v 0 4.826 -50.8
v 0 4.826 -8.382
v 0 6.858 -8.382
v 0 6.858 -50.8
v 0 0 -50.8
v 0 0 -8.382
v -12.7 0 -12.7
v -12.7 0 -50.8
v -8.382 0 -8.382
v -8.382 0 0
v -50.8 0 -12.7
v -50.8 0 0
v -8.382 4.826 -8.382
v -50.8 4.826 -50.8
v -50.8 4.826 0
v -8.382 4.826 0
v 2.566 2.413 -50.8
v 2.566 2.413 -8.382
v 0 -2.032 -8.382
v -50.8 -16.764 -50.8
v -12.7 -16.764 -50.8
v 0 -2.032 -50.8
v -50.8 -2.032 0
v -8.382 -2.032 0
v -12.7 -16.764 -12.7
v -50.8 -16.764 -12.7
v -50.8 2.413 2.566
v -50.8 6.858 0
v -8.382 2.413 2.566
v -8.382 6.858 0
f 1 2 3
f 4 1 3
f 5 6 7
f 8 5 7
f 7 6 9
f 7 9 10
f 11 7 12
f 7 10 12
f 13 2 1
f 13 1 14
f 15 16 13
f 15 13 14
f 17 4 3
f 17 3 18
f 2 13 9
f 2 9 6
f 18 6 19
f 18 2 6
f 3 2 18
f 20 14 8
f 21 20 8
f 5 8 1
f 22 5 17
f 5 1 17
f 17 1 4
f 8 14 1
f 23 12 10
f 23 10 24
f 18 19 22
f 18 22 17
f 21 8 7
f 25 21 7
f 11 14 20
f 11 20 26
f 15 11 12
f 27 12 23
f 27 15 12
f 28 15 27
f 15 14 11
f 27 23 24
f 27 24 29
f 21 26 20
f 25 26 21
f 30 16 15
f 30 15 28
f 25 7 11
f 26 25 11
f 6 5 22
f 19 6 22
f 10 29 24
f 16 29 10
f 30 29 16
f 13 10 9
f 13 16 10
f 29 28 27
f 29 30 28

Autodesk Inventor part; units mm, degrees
ref_plane "YZ Plane" through (0, 0, 0) normal (1, 0, 0) x (0, 1, 0)
ref_plane "XZ Plane" through (0, 0, 0) normal (0, 1, 0) x (-1, 0, 0)
ref_plane "XY Plane" through (0, 0, 0) normal (0, 0, 1) x (1, 0, 0)
sketch "Sketch1" plane through (0, 0, 0) normal (0, 1, 0) x (-1, 0, 0)
  line L0 (0, 0) -> (50.8, 0)
  line L1 (50.8, 0) -> (50.8, -50.8)
  line L2 (50.8, -50.8) -> (0, -50.8)
  line L3 (0, -50.8) -> (0, 0)
  dimension "d0" = 50.8
  dimension "d1" = 50.8
extrude "Extrusion1" add sketch "Sketch1" along normal blind 4.826
sketch "Sketch2" plane through (0, 4.826, 0) normal (0, 1, 0) x (1, 0, 0)
  line L0 (0, 0) -> (-8.382, 0)
  line L1 (-8.382, 0) -> (-8.382, 8.382)
  line L2 (-8.382, 8.382) -> (0, 8.382)
  line L3 (0, 8.382) -> (0, 0)
  line L4 (-8.382, 8.382) -> (-50.8, 8.382)
  line L5 (-50.8, 50.8) -> (-50.8, 0) projected
  line L6 (-8.382, 8.382) -> (-8.382, 50.8)
  dimension "d4" = 8.382
  dimension "d5" = 8.382
extrude "Extrusion2" cut sketch "Sketch2" against normal blind 4.826
sketch "Sketch3" plane through (-8.382, 4.826, 0) normal (1, 0, 0) x (0, 0, -1)
  line L0 (0, -4.826) -> (0, 0) projected
  line L1 (0, 0) -> (0, 2.032)
  line L2 (0, -4.826) -> (0, -6.858)
  line L3 (0, -6.858) -> (-6.204, 3.8876)
  line L4 (0, 2.032) -> (-4.5461, -5.842)
  line L5 (0, 2.032) -> (9.0921, 2.032) construction
  point P0 (-2.5663, -2.413)
  dimension "d8" = 2.032
  dimension "d9" = 2.032
  dimension "d10" = 30
  dimension "d11" = 120
extrude "Extrusion3" add sketch "Sketch3" against normal blind 42.418
sketch "Sketch4" plane through (-8.382, 4.826, -8.382) normal (0, 0, 1) x (1, 0, 0)
  line L0 (8.382, 0) -> (8.382, 2.032)
  line L1 (8.382, 0) -> (10.414, 0) construction
  line L2 (8.382, -4.826) -> (8.382, -6.858)
  line L3 (8.382, -6.858) -> (14.7819, 4.2269)
  line L4 (8.382, 2.032) -> (14.3676, -8.3353)
  line L5 (8.382, 2.032) -> (20.3531, 2.032) construction
  line L6 (8.382, 0) -> (-42.418, 0) projected
  line L7 (8.382, 0) -> (8.382, -4.826)
  point P0 (10.9483, -2.413)
  dimension "d14" = 2.032
  dimension "d15" = 90
  dimension "d16" = 2.032
  dimension "d17" = 30
  dimension "d18" = 60
extrude "Extrusion4" add sketch "Sketch4" against normal blind 42.418
sketch "Sketch6" plane through (0, 0, 0) normal (0, -1, 0) x (1, 0, 0)
  line L0 (-50.8, -50.8) -> (-50.8, 0) projected
  line L1 (-50.8, -50.8) -> (-12.7, -50.8)
  line L2 (-12.7, -50.8) -> (-12.7, -12.7)
  line L3 (-12.7, -12.7) -> (-50.8, -12.7)
  line L4 (-50.8, -12.7) -> (-50.8, -50.8)
  point P0 (0, 0)
  dimension "d21" = 38.1
  dimension "d22" = 38.1
extrude "Extrusion5" add sketch "Sketch6" along normal blind 16.764
properties part number "corner support"
